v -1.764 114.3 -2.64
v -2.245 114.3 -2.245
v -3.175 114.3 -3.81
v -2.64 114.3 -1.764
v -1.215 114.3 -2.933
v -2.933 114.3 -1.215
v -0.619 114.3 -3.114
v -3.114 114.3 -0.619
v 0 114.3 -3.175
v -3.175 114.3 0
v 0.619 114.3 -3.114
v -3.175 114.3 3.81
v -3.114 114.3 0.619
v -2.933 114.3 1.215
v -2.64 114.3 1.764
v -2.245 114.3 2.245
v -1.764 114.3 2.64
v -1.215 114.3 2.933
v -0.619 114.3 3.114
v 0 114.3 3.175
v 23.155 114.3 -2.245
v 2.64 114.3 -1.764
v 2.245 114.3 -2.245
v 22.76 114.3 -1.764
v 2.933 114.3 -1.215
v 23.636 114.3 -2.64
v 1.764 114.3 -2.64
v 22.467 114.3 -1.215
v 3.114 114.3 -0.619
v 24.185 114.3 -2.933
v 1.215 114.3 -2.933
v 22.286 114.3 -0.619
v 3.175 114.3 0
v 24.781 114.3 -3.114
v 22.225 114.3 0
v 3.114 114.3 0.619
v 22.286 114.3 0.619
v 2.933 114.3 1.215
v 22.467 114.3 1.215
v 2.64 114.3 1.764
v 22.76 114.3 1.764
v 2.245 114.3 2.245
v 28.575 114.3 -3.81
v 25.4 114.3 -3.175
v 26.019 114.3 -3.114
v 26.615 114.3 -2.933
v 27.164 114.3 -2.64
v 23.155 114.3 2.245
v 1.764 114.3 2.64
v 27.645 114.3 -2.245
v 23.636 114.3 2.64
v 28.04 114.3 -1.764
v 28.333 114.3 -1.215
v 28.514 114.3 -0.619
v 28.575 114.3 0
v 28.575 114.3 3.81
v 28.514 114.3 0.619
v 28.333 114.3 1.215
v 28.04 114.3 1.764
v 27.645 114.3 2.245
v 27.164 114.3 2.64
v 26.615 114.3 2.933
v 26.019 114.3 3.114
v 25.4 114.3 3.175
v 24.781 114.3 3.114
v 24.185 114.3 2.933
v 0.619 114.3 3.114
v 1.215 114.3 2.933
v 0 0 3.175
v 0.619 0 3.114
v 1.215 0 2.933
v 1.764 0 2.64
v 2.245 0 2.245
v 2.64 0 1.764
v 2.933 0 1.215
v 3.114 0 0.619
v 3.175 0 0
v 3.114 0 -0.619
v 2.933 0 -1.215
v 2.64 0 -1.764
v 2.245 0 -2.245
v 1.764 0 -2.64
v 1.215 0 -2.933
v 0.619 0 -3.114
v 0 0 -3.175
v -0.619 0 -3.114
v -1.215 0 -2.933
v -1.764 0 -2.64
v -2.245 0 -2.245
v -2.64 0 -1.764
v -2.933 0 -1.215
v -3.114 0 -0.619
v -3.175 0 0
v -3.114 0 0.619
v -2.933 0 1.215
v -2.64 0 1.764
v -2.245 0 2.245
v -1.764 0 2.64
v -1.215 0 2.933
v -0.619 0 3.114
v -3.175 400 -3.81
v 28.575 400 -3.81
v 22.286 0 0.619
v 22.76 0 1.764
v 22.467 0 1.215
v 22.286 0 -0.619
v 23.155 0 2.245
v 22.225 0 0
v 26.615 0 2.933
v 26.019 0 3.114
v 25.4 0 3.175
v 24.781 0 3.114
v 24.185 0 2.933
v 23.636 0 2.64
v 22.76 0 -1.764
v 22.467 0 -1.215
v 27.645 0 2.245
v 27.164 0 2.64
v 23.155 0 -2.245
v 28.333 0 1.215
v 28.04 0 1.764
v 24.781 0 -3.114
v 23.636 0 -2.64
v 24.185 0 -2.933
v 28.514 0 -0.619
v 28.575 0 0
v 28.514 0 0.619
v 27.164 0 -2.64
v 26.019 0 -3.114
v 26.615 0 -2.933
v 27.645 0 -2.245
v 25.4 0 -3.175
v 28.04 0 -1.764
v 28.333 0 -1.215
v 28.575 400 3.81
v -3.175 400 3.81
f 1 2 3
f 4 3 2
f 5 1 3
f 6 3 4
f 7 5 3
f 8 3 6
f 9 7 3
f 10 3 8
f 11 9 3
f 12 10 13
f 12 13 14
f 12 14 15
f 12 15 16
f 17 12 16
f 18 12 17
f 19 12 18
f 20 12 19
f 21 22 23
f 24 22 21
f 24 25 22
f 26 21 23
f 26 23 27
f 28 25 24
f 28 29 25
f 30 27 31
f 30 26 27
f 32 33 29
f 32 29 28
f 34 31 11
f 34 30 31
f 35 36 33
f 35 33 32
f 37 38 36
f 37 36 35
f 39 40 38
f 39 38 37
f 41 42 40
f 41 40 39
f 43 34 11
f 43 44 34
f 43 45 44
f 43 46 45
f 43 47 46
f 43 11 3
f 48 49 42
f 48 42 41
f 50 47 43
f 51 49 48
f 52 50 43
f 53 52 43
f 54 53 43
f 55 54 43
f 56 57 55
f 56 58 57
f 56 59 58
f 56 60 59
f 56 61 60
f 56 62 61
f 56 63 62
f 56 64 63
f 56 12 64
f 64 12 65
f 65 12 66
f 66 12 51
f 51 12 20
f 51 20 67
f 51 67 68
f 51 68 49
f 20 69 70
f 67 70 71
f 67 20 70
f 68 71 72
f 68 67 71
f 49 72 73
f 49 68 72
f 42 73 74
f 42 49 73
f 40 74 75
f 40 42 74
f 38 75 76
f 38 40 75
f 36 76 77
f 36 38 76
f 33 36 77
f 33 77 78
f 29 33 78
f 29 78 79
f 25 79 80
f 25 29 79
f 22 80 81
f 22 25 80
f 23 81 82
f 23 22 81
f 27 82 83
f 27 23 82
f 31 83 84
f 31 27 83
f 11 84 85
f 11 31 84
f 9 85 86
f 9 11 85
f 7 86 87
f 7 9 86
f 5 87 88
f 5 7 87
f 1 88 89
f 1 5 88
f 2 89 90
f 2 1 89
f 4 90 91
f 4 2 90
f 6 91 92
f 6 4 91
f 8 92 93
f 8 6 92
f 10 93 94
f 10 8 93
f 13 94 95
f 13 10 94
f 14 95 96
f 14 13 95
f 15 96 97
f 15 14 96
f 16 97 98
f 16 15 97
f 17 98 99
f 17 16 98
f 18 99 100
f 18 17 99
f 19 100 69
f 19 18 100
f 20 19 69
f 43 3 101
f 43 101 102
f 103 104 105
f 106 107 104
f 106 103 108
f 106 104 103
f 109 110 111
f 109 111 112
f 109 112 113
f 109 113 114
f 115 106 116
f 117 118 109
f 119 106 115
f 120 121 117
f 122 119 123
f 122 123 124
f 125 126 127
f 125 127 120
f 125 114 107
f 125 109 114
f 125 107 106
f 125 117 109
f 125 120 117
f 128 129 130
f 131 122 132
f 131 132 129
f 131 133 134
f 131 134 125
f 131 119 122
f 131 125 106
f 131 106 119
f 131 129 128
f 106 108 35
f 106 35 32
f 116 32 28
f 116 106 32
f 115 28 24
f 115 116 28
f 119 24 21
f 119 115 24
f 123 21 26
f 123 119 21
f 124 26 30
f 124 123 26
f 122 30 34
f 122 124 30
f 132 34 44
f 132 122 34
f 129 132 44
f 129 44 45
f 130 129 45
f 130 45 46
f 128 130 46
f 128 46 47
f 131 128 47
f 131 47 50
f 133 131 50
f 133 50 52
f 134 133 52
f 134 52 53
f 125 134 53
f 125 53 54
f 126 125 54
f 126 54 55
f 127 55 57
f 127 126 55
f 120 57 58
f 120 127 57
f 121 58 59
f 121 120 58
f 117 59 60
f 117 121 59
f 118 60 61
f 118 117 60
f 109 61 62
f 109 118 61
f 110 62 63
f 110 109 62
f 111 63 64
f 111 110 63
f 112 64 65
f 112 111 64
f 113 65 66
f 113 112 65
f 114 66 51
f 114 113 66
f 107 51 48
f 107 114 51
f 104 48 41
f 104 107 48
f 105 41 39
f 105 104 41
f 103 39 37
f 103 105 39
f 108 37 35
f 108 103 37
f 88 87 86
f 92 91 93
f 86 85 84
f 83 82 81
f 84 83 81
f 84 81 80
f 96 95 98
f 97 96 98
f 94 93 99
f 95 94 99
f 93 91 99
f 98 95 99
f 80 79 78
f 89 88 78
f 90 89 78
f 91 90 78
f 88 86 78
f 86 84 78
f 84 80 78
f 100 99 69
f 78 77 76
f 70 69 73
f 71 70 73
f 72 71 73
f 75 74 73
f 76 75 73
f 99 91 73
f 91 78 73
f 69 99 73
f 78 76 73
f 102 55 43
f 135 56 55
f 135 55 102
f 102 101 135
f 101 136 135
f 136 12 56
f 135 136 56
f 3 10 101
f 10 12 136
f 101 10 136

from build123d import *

# Parameters (mm, degrees)
SWEEP1_PROFILE_R    = 3.175
SWEEP2_PROFILE_R    = 3.175
SKETCH42_W          = 31.75
SKETCH42_H          = 285.7
BOSS_EXTRUDE1_DEPTH = 3.81


with BuildPart() as part:
    # Sweep1: sweep along a path in Sketch1
    with BuildLine(Plane.XY) as sweep1_path:
        Line((0, 0), (0, 114.3))
    # Sweep1 profile (on start of the path) → Sweep1 (sweep)
    with BuildSketch(Plane.ZX):
        Circle(SWEEP1_PROFILE_R)
    sweep(path=sweep1_path.line)



with BuildPart() as body_2:
    # Sweep2: sweep along a path in Sketch1<3>
    with BuildLine(Plane.XY) as sweep2_path:
        Line((25.4, 114.3), (25.4, 0))
    # Sweep2 profile (on start of the path) → Sweep2 (sweep)
    with BuildSketch(Plane(origin=(25.4, 114.3, 0), x_dir=(-1, 0, 0), z_dir=(0, -1, 0))):
        Circle(SWEEP2_PROFILE_R)
    sweep(path=sweep2_path.line)


with BuildPart() as part_1:
    add(part.part)

    add(body_2.part)  # Boss-Extrude1 merges body 2
    # Sketch42 → Boss-Extrude1 (add, symmetric)
    with BuildSketch(Plane.XY):
        with Locations((12.7, 257.15)):
            Rectangle(SKETCH42_W, SKETCH42_H)
    extrude(amount=BOSS_EXTRUDE1_DEPTH, both=True)


solid = part_1.part
